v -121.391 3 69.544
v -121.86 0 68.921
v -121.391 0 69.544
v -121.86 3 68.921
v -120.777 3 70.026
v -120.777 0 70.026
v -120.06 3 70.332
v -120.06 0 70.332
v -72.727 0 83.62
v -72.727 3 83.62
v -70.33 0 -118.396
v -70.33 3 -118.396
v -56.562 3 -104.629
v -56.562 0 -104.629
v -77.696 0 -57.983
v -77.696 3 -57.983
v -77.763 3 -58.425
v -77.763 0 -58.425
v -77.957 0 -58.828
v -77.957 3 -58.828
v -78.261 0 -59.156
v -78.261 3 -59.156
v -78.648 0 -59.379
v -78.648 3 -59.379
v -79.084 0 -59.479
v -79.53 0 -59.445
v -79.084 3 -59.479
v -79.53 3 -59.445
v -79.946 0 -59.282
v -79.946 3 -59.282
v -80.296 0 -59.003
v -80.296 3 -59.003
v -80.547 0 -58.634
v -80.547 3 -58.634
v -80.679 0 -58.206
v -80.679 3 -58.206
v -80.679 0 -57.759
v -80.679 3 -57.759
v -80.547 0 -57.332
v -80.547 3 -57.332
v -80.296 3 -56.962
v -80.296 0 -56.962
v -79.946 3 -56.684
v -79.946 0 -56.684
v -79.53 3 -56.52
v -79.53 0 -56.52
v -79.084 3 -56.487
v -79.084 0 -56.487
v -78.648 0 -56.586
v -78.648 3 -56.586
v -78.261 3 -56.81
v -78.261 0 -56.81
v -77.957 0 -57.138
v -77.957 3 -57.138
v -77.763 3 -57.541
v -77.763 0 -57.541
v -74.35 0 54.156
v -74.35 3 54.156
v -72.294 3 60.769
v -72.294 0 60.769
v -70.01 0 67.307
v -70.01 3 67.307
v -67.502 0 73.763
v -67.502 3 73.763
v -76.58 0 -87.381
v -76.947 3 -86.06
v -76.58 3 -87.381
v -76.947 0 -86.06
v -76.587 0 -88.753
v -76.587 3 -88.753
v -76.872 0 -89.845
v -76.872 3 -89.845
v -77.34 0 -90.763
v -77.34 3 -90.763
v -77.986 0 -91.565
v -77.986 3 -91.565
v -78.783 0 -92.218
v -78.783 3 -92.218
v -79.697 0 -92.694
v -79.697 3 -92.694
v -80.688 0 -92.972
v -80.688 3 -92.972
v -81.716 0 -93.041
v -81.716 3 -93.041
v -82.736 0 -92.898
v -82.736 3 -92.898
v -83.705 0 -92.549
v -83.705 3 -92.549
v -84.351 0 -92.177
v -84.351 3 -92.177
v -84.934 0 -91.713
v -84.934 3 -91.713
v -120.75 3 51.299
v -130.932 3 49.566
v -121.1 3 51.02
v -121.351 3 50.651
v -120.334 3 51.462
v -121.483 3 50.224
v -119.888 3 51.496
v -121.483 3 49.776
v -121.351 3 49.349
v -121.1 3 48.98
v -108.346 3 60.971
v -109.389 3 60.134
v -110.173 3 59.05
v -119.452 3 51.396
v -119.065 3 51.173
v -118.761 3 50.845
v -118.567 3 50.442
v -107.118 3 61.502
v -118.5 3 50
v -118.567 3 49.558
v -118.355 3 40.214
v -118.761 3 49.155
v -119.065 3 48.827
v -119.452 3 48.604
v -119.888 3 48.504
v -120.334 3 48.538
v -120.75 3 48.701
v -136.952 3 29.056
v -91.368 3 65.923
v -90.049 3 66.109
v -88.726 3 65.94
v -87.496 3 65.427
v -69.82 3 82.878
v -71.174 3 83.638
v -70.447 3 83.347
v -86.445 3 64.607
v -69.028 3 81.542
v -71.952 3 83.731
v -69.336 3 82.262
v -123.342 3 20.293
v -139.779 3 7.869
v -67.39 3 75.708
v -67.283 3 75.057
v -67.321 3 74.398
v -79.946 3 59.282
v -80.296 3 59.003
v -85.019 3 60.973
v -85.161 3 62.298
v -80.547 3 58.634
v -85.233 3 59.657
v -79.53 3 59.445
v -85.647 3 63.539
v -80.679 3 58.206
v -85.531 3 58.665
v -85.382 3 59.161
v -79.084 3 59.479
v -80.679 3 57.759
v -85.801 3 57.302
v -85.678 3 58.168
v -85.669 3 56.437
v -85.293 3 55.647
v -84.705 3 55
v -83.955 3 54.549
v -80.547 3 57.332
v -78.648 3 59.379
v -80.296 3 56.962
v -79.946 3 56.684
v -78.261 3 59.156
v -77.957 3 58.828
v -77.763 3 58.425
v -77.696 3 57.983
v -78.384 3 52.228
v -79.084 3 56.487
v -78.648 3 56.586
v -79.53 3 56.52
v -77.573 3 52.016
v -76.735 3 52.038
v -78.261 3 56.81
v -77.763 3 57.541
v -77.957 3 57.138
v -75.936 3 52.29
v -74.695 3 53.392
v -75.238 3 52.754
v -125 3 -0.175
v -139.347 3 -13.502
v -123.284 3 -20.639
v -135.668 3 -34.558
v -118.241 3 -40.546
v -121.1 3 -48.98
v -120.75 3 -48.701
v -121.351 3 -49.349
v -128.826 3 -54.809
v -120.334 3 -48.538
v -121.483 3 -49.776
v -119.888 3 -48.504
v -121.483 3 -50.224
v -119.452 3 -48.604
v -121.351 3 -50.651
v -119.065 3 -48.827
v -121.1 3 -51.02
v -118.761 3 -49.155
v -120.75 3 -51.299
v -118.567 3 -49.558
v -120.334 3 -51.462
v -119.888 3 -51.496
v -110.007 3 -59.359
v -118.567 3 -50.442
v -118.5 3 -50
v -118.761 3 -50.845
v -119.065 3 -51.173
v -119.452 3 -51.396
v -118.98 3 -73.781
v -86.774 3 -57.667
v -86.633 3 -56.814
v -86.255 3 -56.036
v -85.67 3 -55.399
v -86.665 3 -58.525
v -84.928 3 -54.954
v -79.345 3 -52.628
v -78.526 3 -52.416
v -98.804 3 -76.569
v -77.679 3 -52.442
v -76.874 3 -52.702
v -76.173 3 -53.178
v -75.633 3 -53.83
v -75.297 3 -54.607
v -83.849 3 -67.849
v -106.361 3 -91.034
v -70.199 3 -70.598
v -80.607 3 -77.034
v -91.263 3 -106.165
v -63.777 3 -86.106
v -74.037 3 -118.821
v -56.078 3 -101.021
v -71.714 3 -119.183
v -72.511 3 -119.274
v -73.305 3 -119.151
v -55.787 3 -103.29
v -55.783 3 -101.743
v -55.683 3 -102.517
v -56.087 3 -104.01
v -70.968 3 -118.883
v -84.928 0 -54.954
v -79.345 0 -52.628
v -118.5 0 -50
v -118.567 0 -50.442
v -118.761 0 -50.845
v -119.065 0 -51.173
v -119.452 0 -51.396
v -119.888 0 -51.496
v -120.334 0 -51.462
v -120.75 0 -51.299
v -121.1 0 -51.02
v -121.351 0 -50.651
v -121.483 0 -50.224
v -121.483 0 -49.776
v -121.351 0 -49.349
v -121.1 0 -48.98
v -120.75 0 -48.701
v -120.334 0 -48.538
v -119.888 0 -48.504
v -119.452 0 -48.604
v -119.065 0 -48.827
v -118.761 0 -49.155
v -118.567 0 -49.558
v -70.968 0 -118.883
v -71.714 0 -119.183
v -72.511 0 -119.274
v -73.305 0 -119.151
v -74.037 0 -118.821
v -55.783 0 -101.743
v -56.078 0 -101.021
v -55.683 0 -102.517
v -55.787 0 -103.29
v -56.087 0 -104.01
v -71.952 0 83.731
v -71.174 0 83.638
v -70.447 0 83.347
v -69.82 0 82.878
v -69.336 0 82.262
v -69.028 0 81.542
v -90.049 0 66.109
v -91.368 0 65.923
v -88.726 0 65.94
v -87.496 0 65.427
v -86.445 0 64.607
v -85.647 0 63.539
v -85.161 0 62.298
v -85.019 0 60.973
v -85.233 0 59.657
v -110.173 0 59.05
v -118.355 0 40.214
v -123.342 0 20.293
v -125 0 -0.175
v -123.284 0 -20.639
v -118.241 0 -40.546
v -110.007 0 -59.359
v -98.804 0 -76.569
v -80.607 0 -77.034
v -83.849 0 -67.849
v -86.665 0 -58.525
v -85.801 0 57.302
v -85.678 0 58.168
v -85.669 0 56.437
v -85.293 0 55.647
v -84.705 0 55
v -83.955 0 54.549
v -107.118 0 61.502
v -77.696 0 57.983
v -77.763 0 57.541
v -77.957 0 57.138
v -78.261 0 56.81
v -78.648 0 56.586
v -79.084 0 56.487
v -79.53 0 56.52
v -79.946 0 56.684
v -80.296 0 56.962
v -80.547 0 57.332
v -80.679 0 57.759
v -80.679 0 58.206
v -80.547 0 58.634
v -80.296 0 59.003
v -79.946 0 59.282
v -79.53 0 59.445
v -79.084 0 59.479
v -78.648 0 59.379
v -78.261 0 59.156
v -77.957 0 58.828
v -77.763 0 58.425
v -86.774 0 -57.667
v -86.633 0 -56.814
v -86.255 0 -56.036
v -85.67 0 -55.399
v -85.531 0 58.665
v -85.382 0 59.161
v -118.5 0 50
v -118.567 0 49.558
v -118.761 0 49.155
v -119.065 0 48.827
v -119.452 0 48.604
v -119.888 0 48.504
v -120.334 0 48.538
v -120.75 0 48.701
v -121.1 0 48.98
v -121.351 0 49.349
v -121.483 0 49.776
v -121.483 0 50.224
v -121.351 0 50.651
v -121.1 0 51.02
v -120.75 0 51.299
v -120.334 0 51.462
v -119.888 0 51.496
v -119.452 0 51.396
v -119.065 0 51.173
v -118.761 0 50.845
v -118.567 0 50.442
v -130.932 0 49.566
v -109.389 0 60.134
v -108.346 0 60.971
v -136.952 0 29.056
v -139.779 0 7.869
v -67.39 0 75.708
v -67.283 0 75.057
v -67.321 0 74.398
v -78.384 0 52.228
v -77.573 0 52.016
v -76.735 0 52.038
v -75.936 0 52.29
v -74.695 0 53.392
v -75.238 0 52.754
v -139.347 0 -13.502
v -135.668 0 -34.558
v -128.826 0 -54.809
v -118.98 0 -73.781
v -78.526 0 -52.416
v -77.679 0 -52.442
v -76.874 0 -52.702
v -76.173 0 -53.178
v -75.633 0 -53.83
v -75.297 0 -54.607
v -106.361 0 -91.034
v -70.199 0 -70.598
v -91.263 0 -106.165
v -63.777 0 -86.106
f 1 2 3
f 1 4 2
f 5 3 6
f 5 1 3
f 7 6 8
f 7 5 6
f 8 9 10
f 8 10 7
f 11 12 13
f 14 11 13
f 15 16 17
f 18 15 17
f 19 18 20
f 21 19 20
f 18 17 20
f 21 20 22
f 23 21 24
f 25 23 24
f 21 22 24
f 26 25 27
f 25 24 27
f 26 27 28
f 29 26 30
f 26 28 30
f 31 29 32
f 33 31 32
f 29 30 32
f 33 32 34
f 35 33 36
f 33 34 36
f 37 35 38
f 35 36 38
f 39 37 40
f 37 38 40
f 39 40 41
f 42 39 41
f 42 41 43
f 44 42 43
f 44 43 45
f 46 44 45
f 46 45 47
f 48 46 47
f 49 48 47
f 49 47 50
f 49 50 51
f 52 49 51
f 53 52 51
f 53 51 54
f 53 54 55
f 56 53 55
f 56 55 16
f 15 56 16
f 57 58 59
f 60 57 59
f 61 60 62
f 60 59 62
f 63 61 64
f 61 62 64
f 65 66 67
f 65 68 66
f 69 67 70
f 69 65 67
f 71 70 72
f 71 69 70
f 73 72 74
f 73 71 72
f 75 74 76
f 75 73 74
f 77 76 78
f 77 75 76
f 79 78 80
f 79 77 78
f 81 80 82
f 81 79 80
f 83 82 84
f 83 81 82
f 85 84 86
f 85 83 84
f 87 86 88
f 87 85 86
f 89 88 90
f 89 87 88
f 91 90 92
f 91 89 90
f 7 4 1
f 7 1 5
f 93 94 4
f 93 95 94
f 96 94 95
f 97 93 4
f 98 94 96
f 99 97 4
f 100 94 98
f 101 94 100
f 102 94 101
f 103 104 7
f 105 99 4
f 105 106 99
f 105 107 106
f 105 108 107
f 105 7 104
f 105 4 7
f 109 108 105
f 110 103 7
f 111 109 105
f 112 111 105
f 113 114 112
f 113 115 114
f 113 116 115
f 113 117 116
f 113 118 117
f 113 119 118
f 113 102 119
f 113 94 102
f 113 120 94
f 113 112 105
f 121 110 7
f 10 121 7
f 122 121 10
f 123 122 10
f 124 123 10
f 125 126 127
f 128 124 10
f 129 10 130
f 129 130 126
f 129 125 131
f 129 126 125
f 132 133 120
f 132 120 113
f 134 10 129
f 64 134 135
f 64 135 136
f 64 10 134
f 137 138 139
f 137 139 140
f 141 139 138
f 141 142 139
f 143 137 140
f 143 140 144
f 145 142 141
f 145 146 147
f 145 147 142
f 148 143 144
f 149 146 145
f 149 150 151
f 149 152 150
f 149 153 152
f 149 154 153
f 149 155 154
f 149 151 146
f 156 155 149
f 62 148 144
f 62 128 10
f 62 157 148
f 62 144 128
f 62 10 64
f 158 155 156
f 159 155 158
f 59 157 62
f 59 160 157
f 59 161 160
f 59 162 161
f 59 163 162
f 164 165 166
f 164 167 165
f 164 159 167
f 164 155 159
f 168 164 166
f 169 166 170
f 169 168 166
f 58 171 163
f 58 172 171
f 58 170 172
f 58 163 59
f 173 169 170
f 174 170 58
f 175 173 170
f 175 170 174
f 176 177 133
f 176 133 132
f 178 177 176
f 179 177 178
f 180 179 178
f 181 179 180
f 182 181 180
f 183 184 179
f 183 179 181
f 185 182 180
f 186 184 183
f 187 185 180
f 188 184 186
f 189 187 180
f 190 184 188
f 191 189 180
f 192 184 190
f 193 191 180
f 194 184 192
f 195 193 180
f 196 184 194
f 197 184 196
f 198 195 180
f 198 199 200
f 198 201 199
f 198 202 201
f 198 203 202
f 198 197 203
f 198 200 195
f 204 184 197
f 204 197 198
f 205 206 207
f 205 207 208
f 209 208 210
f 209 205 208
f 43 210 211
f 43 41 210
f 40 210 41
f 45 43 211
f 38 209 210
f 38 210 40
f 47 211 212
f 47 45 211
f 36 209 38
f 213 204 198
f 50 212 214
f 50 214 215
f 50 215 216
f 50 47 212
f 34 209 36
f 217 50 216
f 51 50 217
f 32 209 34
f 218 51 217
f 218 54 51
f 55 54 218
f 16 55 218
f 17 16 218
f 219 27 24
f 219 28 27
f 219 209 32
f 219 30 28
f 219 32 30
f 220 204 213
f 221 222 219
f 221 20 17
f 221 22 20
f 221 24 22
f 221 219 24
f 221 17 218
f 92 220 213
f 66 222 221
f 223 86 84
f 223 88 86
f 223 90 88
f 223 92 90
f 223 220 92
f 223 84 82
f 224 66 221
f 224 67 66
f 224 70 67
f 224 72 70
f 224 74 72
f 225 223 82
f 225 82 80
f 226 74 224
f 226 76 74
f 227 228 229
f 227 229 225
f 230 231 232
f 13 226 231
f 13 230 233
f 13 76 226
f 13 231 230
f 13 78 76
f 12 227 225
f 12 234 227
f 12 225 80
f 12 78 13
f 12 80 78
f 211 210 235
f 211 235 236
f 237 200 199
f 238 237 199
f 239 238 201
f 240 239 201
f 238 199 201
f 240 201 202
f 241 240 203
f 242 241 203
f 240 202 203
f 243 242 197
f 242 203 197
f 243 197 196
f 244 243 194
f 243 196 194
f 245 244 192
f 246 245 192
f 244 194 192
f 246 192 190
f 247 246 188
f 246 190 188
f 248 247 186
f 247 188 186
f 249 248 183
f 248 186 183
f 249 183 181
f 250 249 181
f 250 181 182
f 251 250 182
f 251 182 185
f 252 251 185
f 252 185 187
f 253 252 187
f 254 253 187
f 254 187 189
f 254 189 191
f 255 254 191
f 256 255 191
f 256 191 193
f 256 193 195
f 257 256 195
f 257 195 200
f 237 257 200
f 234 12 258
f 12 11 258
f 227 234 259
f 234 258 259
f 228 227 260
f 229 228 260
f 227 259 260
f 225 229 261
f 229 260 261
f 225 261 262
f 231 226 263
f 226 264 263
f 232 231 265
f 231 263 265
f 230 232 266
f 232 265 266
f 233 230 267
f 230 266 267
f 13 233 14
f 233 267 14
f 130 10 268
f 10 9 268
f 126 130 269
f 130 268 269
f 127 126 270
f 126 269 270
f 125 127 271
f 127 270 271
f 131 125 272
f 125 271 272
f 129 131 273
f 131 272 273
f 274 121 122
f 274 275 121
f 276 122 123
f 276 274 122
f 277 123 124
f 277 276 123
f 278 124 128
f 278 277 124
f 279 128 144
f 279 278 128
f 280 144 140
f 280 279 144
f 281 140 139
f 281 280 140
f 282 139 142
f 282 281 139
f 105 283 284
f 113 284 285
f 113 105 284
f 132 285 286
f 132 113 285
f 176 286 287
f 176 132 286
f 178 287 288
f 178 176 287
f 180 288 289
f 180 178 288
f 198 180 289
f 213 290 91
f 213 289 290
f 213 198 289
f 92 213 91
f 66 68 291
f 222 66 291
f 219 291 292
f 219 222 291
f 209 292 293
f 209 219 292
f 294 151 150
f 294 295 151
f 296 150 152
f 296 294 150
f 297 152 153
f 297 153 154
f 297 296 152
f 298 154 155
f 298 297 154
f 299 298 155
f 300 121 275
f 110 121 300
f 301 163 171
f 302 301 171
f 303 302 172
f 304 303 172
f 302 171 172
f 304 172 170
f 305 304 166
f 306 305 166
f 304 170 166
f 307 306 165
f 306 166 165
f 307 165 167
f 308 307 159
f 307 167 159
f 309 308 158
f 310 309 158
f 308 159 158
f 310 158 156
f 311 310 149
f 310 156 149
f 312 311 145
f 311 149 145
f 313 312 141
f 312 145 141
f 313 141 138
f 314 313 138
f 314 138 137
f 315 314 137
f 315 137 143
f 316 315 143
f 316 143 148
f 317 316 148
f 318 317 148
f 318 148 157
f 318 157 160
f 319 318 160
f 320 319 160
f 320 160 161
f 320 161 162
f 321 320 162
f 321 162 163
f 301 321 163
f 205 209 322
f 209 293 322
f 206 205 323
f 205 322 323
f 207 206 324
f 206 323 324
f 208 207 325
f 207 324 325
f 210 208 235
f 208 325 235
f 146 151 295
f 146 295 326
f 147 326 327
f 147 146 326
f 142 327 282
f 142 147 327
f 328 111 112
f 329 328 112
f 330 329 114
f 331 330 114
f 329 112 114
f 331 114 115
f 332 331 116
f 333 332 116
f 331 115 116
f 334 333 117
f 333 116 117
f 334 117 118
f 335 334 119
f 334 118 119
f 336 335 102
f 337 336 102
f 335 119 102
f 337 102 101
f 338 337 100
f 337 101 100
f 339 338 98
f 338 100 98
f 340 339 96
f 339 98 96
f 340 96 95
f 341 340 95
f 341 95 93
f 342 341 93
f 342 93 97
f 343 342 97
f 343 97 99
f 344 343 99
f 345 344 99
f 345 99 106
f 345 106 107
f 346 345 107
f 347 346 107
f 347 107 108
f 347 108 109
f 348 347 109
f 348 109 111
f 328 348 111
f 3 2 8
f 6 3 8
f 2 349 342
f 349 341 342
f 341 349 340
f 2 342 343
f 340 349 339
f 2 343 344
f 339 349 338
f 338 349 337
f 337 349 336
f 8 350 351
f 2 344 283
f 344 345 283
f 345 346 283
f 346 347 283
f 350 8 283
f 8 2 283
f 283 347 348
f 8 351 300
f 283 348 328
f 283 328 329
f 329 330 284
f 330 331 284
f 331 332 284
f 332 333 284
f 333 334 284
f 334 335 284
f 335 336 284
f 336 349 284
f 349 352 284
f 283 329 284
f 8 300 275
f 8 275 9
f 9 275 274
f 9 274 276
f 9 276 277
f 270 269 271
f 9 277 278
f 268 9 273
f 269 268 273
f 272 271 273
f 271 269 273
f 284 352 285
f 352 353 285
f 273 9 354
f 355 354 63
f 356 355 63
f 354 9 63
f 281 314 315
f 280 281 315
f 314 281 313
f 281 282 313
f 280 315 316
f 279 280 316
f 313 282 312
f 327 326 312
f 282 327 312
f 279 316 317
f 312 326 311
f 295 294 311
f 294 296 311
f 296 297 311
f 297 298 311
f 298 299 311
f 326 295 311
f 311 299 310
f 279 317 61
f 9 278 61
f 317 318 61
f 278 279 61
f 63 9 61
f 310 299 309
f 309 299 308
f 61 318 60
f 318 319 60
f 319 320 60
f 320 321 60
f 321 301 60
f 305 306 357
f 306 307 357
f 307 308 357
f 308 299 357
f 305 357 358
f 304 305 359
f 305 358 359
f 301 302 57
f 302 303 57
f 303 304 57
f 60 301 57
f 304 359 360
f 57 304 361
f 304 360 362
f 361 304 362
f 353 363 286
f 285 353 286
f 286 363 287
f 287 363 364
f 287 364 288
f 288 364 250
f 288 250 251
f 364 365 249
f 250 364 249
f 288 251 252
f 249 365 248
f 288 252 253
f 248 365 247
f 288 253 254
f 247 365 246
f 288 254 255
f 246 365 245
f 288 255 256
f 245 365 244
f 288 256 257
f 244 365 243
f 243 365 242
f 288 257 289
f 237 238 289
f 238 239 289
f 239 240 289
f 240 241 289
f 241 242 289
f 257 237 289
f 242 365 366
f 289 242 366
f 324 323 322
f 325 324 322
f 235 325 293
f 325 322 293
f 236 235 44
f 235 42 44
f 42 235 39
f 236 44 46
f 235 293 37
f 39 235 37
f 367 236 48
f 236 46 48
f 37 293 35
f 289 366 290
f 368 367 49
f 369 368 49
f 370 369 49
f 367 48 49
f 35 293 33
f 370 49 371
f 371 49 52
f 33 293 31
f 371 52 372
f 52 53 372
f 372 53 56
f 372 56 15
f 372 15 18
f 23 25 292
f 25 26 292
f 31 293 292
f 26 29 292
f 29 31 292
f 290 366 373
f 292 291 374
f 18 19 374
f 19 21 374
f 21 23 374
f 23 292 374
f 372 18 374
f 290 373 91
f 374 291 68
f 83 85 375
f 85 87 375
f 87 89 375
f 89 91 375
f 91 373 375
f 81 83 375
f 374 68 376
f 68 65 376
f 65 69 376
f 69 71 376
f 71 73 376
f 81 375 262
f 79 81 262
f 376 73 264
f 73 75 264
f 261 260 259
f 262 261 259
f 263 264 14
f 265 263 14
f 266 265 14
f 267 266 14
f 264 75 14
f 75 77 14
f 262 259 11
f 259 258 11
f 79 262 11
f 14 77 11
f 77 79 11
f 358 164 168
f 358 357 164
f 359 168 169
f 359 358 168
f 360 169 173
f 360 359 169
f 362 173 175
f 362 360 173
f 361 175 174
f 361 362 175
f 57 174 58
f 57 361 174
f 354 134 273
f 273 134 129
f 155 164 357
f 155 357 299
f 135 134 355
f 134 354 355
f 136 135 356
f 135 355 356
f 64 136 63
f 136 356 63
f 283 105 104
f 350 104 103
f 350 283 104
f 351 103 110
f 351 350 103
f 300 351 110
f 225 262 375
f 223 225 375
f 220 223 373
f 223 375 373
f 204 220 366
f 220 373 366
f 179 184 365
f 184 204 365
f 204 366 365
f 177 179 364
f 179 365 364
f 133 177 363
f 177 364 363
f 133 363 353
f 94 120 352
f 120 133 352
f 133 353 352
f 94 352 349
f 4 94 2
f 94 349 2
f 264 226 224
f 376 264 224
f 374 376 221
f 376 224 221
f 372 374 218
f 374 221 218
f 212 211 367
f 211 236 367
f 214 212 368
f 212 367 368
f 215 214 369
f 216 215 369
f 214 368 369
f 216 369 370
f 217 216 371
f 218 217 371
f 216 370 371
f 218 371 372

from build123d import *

# Parameters (mm, degrees)
SKETCH1_R               = 140
BOSS_EXTRUDE1_DEPTH     = 3
CUT_EXTRUDE1_REACH      = 5
CUT_EXTRUDE3_REACH      = 5
SKETCH19_R              = 1.5
CUT_EXTRUDE10_REACH     = 5
SKETCH25_R              = 1.5
CUT_EXTRUDE4_REACH      = 5
FILLET2_R               = 10
CUT_EXTRUDE8_DEPTH      = 1
CUT_EXTRUDE8_DEPTH_BACK = 4
CUT_EXTRUDE9_REACH      = 5
FILLET4_R               = 5
FILLET5_R               = 3


with BuildPart() as part:
    # Sketch1 → Boss-Extrude1 (new body)
    with BuildSketch(Plane(origin=(0, 0, 0), x_dir=(1, 0, 0), z_dir=(0, 1, 0))):
        Circle(SKETCH1_R)
    extrude(amount=BOSS_EXTRUDE1_DEPTH)

    # Sketch17 → Cut-Extrude1 (cut, up to next)
    with BuildSketch(Plane.XZ, mode=Mode.PRIVATE) as cut_extrude1_sk1:
        Polygon((-50, 90), (-121.24355653, 70), (-121.24355653, 140), (121.24355653, 140), (121.24355653, 70), (50, 90), align=None)
    cut_extrude1_tool1 = extrude(cut_extrude1_sk1.sketch, amount=-CUT_EXTRUDE1_REACH, mode=Mode.PRIVATE) & part.part
    add(cut_extrude1_tool1.solids().sort_by_distance((0, 0, 111.669853))[0], mode=Mode.SUBTRACT)

    # Sketch19 → Cut-Extrude3 (cut, up to next)
    with BuildSketch(Plane(origin=(0, 3, 0), x_dir=(1, 0, 0), z_dir=(0, 1, 0)), mode=Mode.PRIVATE) as cut_extrude3_sk1:
        with Locations((-79.195959493, -57.982756057)):
            Circle(SKETCH19_R)
    cut_extrude3_tool1 = extrude(cut_extrude3_sk1.sketch, amount=-CUT_EXTRUDE3_REACH, mode=Mode.PRIVATE) & part.part
    add(cut_extrude3_tool1.solids().sort_by_distance((-79.195959, 3, 57.982756))[0], mode=Mode.SUBTRACT)
    # Sketch19 → Cut-Extrude3 (cut, up to next)
    with BuildSketch(Plane(origin=(0, 3, 0), x_dir=(1, 0, 0), z_dir=(0, 1, 0)), mode=Mode.PRIVATE) as cut_extrude3_sk2:
        with Locations((-79.195959493, 57.982756057)):
            Circle(SKETCH19_R)
    cut_extrude3_tool2 = extrude(cut_extrude3_sk2.sketch, amount=-CUT_EXTRUDE3_REACH, mode=Mode.PRIVATE) & part.part
    add(cut_extrude3_tool2.solids().sort_by_distance((-79.195959, 3, -57.982756))[0], mode=Mode.SUBTRACT)
    # Sketch19 → Cut-Extrude3 (cut, up to next)
    with BuildSketch(Plane(origin=(0, 3, 0), x_dir=(1, 0, 0), z_dir=(0, 1, 0)), mode=Mode.PRIVATE) as cut_extrude3_sk3:
        with Locations((79.195959493, 57.982756057)):
            Circle(SKETCH19_R)
    cut_extrude3_tool3 = extrude(cut_extrude3_sk3.sketch, amount=-CUT_EXTRUDE3_REACH, mode=Mode.PRIVATE) & part.part
    add(cut_extrude3_tool3.solids().sort_by_distance((79.195959, 3, -57.982756))[0], mode=Mode.SUBTRACT)
    # Sketch19 → Cut-Extrude3 (cut, up to next)
    with BuildSketch(Plane(origin=(0, 3, 0), x_dir=(1, 0, 0), z_dir=(0, 1, 0)), mode=Mode.PRIVATE) as cut_extrude3_sk4:
        with Locations((79.195959493, -57.982756057)):
            Circle(SKETCH19_R)
    cut_extrude3_tool4 = extrude(cut_extrude3_sk4.sketch, amount=-CUT_EXTRUDE3_REACH, mode=Mode.PRIVATE) & part.part
    add(cut_extrude3_tool4.solids().sort_by_distance((79.195959, 3, 57.982756))[0], mode=Mode.SUBTRACT)
    # Sketch19 → Cut-Extrude3 (cut, up to next)
    with BuildSketch(Plane(origin=(0, 3, 0), x_dir=(1, 0, 0), z_dir=(0, 1, 0)), mode=Mode.PRIVATE) as cut_extrude3_sk5:
        with Locations((-57.982756057, 79.195959493)):
            Circle(SKETCH19_R)
    cut_extrude3_tool5 = extrude(cut_extrude3_sk5.sketch, amount=-CUT_EXTRUDE3_REACH, mode=Mode.PRIVATE) & part.part
    add(cut_extrude3_tool5.solids().sort_by_distance((-57.982756, 3, -79.195959))[0], mode=Mode.SUBTRACT)
    # Sketch19 → Cut-Extrude3 (cut, up to next)
    with BuildSketch(Plane(origin=(0, 3, 0), x_dir=(1, 0, 0), z_dir=(0, 1, 0)), mode=Mode.PRIVATE) as cut_extrude3_sk6:
        with Locations((57.982756057, 79.195959493)):
            Circle(SKETCH19_R)
    cut_extrude3_tool6 = extrude(cut_extrude3_sk6.sketch, amount=-CUT_EXTRUDE3_REACH, mode=Mode.PRIVATE) & part.part
    add(cut_extrude3_tool6.solids().sort_by_distance((57.982756, 3, -79.195959))[0], mode=Mode.SUBTRACT)
    # Sketch19 → Cut-Extrude3 (cut, up to next)
    with BuildSketch(Plane(origin=(0, 3, 0), x_dir=(1, 0, 0), z_dir=(0, 1, 0)), mode=Mode.PRIVATE) as cut_extrude3_sk7:
        with Locations((57.982756057, -79.195959493)):
            Circle(SKETCH19_R)
    cut_extrude3_tool7 = extrude(cut_extrude3_sk7.sketch, amount=-CUT_EXTRUDE3_REACH, mode=Mode.PRIVATE) & part.part
    add(cut_extrude3_tool7.solids().sort_by_distance((57.982756, 3, 79.195959))[0], mode=Mode.SUBTRACT)
    # Sketch19 → Cut-Extrude3 (cut, up to next)
    with BuildSketch(Plane(origin=(0, 3, 0), x_dir=(1, 0, 0), z_dir=(0, 1, 0)), mode=Mode.PRIVATE) as cut_extrude3_sk8:
        with Locations((-57.982756057, -79.195959493)):
            Circle(SKETCH19_R)
    cut_extrude3_tool8 = extrude(cut_extrude3_sk8.sketch, amount=-CUT_EXTRUDE3_REACH, mode=Mode.PRIVATE) & part.part
    add(cut_extrude3_tool8.solids().sort_by_distance((-57.982756, 3, 79.195959))[0], mode=Mode.SUBTRACT)

    # Sketch25 → Cut-Extrude10 (cut, up to next)
    with BuildSketch(Plane(origin=(0, 3, 0), x_dir=(1, 0, 0), z_dir=(0, 1, 0)), mode=Mode.PRIVATE) as cut_extrude10_sk1:
        with Locations((-120, 50)):
            Circle(SKETCH25_R)
    cut_extrude10_tool1 = extrude(cut_extrude10_sk1.sketch, amount=-CUT_EXTRUDE10_REACH, mode=Mode.PRIVATE) & part.part
    add(cut_extrude10_tool1.solids().sort_by_distance((-120, 3, -50))[0], mode=Mode.SUBTRACT)
    # Sketch25 → Cut-Extrude10 (cut, up to next)
    with BuildSketch(Plane(origin=(0, 3, 0), x_dir=(1, 0, 0), z_dir=(0, 1, 0)), mode=Mode.PRIVATE) as cut_extrude10_sk2:
        with Locations((-120, -50)):
            Circle(SKETCH25_R)
    cut_extrude10_tool2 = extrude(cut_extrude10_sk2.sketch, amount=-CUT_EXTRUDE10_REACH, mode=Mode.PRIVATE) & part.part
    add(cut_extrude10_tool2.solids().sort_by_distance((-120, 3, 50))[0], mode=Mode.SUBTRACT)

    # Sketch20 → Cut-Extrude4 (cut, up to next)
    with BuildSketch(Plane(origin=(0, 3, 0), x_dir=(1, 0, 0), z_dir=(0, 1, 0)), mode=Mode.PRIVATE) as cut_extrude4_sk1:
        Polygon((-501.142143979, 549.208792138), (-72, 120.066648158), (-50, 98.066648158), (50, 98.066648158), (72, 120.066648158), (501.142143979, 549.208792138), (501.142143979, 1763.00607254), (-501.142143979, 1763.00607254), align=None)
    cut_extrude4_tool1 = extrude(cut_extrude4_sk1.sketch, amount=-CUT_EXTRUDE4_REACH, mode=Mode.PRIVATE) & part.part
    add(cut_extrude4_tool1.solids().sort_by_distance((0, 3, -1025.283687))[0], mode=Mode.SUBTRACT)

    # Fillet2
    fillet2_edges = [part.edges().sort_by_distance(p)[0] for p in [
        (50, 1.5, -98.066648158),
        (-50, 1.5, -98.066648158),
    ]]
    fillet(fillet2_edges, radius=FILLET2_R)

    # Sketch23 → Cut-Extrude8 (cut, two sides)
    with BuildSketch(Plane(origin=(0, 3, 0), x_dir=(1, 0, 0), z_dir=(0, 1, 0))) as cut_extrude8_sk:
        with BuildLine():
            Line((257.25555619, 635.882543767), (-54.933351842, 103))
            ThreePointArc((-54.933351842, 103), (-81.898962794, 15.574433529), (-67.110613718, -74.712213204))
            Line((-67.110613718, -74.712213204), (-73.189737717, -96.367133919))
            Line((-73.189737717, -96.367133919), (-240.113193325, -690.978166206))
            Line((-240.113193325, -690.978166206), (916.492938423, -1124.527627053))
            Line((916.492938423, -1124.527627053), (1413.861687938, 202.33308292))
            Line((1413.861687938, 202.33308292), (257.25555619, 635.882543767))
        make_face()
    extrude(amount=CUT_EXTRUDE8_DEPTH, mode=Mode.SUBTRACT)
    extrude(cut_extrude8_sk.sketch, amount=-CUT_EXTRUDE8_DEPTH_BACK, mode=Mode.SUBTRACT)

    # Sketch24 → Cut-Extrude9 (cut, up to next)
    with BuildSketch(Plane(origin=(0, 3, 0), x_dir=(1, 0, 0), z_dir=(0, 1, 0)), mode=Mode.PRIVATE) as cut_extrude9_sk1:
        with BuildLine():
            Line((-87.357146899, 55.966584143), (-76.169199175, 51.304939258))
            Line((-76.169199175, 51.304939258), (-75.263305358, -50.927483501))
            Line((-75.263305358, -50.927483501), (-86.425648637, -55.578459868))
            ThreePointArc((-86.425648637, -55.578459868), (-84.491324796, -62.048707618), (-82.351900579, -68.454063088))
            Line((-82.351900579, -68.454063088), (-109.142815319, -60.933126165))
            ThreePointArc((-109.142815319, -60.933126165), (-121.247849947, 30.39669198), (-67.489752352, 105.2147011))
            ThreePointArc((-67.489752352, 105.2147011), (-78.971583679, 81.215182034), (-87.357146899, 55.966584143))
        make_face()
    cut_extrude9_tool1 = extrude(cut_extrude9_sk1.sketch, amount=-CUT_EXTRUDE9_REACH, mode=Mode.PRIVATE) & part.part
    add(cut_extrude9_tool1.solids().sort_by_distance((-97.439624, 3, -6.929648))[0], mode=Mode.SUBTRACT)

    # Fillet4
    fillet4_edges = [part.edges().sort_by_distance(p)[0] for p in [
        (-109.142815319, 1.5, 60.933126165),
        (-67.489752352, 1.5, -105.2147011),
        (-82.351900579, 1.5, 68.454063088),
    ]]
    fillet(fillet4_edges, radius=FILLET4_R)

    # Fillet5
    fillet5_edges = [part.edges().sort_by_distance(p)[0] for p in [
        (-87.357146899, 1.5, -55.966584143),
        (-76.169199175, 1.5, -51.304939258),
        (-75.263305358, 1.5, 50.927483501),
        (-86.425648637, 1.5, 55.578459868),
        (-121.24355653, 1.5, 70),
        (-72, 1.5, -120.066648158),
        (-54.933351842, 1.5, -103),
        (-69.838855295, 1.5, 84.430694855),
        (-67.110613718, 1.5, 74.712213204),
    ]]
    fillet(fillet5_edges, radius=FILLET5_R)


solid = part.part
